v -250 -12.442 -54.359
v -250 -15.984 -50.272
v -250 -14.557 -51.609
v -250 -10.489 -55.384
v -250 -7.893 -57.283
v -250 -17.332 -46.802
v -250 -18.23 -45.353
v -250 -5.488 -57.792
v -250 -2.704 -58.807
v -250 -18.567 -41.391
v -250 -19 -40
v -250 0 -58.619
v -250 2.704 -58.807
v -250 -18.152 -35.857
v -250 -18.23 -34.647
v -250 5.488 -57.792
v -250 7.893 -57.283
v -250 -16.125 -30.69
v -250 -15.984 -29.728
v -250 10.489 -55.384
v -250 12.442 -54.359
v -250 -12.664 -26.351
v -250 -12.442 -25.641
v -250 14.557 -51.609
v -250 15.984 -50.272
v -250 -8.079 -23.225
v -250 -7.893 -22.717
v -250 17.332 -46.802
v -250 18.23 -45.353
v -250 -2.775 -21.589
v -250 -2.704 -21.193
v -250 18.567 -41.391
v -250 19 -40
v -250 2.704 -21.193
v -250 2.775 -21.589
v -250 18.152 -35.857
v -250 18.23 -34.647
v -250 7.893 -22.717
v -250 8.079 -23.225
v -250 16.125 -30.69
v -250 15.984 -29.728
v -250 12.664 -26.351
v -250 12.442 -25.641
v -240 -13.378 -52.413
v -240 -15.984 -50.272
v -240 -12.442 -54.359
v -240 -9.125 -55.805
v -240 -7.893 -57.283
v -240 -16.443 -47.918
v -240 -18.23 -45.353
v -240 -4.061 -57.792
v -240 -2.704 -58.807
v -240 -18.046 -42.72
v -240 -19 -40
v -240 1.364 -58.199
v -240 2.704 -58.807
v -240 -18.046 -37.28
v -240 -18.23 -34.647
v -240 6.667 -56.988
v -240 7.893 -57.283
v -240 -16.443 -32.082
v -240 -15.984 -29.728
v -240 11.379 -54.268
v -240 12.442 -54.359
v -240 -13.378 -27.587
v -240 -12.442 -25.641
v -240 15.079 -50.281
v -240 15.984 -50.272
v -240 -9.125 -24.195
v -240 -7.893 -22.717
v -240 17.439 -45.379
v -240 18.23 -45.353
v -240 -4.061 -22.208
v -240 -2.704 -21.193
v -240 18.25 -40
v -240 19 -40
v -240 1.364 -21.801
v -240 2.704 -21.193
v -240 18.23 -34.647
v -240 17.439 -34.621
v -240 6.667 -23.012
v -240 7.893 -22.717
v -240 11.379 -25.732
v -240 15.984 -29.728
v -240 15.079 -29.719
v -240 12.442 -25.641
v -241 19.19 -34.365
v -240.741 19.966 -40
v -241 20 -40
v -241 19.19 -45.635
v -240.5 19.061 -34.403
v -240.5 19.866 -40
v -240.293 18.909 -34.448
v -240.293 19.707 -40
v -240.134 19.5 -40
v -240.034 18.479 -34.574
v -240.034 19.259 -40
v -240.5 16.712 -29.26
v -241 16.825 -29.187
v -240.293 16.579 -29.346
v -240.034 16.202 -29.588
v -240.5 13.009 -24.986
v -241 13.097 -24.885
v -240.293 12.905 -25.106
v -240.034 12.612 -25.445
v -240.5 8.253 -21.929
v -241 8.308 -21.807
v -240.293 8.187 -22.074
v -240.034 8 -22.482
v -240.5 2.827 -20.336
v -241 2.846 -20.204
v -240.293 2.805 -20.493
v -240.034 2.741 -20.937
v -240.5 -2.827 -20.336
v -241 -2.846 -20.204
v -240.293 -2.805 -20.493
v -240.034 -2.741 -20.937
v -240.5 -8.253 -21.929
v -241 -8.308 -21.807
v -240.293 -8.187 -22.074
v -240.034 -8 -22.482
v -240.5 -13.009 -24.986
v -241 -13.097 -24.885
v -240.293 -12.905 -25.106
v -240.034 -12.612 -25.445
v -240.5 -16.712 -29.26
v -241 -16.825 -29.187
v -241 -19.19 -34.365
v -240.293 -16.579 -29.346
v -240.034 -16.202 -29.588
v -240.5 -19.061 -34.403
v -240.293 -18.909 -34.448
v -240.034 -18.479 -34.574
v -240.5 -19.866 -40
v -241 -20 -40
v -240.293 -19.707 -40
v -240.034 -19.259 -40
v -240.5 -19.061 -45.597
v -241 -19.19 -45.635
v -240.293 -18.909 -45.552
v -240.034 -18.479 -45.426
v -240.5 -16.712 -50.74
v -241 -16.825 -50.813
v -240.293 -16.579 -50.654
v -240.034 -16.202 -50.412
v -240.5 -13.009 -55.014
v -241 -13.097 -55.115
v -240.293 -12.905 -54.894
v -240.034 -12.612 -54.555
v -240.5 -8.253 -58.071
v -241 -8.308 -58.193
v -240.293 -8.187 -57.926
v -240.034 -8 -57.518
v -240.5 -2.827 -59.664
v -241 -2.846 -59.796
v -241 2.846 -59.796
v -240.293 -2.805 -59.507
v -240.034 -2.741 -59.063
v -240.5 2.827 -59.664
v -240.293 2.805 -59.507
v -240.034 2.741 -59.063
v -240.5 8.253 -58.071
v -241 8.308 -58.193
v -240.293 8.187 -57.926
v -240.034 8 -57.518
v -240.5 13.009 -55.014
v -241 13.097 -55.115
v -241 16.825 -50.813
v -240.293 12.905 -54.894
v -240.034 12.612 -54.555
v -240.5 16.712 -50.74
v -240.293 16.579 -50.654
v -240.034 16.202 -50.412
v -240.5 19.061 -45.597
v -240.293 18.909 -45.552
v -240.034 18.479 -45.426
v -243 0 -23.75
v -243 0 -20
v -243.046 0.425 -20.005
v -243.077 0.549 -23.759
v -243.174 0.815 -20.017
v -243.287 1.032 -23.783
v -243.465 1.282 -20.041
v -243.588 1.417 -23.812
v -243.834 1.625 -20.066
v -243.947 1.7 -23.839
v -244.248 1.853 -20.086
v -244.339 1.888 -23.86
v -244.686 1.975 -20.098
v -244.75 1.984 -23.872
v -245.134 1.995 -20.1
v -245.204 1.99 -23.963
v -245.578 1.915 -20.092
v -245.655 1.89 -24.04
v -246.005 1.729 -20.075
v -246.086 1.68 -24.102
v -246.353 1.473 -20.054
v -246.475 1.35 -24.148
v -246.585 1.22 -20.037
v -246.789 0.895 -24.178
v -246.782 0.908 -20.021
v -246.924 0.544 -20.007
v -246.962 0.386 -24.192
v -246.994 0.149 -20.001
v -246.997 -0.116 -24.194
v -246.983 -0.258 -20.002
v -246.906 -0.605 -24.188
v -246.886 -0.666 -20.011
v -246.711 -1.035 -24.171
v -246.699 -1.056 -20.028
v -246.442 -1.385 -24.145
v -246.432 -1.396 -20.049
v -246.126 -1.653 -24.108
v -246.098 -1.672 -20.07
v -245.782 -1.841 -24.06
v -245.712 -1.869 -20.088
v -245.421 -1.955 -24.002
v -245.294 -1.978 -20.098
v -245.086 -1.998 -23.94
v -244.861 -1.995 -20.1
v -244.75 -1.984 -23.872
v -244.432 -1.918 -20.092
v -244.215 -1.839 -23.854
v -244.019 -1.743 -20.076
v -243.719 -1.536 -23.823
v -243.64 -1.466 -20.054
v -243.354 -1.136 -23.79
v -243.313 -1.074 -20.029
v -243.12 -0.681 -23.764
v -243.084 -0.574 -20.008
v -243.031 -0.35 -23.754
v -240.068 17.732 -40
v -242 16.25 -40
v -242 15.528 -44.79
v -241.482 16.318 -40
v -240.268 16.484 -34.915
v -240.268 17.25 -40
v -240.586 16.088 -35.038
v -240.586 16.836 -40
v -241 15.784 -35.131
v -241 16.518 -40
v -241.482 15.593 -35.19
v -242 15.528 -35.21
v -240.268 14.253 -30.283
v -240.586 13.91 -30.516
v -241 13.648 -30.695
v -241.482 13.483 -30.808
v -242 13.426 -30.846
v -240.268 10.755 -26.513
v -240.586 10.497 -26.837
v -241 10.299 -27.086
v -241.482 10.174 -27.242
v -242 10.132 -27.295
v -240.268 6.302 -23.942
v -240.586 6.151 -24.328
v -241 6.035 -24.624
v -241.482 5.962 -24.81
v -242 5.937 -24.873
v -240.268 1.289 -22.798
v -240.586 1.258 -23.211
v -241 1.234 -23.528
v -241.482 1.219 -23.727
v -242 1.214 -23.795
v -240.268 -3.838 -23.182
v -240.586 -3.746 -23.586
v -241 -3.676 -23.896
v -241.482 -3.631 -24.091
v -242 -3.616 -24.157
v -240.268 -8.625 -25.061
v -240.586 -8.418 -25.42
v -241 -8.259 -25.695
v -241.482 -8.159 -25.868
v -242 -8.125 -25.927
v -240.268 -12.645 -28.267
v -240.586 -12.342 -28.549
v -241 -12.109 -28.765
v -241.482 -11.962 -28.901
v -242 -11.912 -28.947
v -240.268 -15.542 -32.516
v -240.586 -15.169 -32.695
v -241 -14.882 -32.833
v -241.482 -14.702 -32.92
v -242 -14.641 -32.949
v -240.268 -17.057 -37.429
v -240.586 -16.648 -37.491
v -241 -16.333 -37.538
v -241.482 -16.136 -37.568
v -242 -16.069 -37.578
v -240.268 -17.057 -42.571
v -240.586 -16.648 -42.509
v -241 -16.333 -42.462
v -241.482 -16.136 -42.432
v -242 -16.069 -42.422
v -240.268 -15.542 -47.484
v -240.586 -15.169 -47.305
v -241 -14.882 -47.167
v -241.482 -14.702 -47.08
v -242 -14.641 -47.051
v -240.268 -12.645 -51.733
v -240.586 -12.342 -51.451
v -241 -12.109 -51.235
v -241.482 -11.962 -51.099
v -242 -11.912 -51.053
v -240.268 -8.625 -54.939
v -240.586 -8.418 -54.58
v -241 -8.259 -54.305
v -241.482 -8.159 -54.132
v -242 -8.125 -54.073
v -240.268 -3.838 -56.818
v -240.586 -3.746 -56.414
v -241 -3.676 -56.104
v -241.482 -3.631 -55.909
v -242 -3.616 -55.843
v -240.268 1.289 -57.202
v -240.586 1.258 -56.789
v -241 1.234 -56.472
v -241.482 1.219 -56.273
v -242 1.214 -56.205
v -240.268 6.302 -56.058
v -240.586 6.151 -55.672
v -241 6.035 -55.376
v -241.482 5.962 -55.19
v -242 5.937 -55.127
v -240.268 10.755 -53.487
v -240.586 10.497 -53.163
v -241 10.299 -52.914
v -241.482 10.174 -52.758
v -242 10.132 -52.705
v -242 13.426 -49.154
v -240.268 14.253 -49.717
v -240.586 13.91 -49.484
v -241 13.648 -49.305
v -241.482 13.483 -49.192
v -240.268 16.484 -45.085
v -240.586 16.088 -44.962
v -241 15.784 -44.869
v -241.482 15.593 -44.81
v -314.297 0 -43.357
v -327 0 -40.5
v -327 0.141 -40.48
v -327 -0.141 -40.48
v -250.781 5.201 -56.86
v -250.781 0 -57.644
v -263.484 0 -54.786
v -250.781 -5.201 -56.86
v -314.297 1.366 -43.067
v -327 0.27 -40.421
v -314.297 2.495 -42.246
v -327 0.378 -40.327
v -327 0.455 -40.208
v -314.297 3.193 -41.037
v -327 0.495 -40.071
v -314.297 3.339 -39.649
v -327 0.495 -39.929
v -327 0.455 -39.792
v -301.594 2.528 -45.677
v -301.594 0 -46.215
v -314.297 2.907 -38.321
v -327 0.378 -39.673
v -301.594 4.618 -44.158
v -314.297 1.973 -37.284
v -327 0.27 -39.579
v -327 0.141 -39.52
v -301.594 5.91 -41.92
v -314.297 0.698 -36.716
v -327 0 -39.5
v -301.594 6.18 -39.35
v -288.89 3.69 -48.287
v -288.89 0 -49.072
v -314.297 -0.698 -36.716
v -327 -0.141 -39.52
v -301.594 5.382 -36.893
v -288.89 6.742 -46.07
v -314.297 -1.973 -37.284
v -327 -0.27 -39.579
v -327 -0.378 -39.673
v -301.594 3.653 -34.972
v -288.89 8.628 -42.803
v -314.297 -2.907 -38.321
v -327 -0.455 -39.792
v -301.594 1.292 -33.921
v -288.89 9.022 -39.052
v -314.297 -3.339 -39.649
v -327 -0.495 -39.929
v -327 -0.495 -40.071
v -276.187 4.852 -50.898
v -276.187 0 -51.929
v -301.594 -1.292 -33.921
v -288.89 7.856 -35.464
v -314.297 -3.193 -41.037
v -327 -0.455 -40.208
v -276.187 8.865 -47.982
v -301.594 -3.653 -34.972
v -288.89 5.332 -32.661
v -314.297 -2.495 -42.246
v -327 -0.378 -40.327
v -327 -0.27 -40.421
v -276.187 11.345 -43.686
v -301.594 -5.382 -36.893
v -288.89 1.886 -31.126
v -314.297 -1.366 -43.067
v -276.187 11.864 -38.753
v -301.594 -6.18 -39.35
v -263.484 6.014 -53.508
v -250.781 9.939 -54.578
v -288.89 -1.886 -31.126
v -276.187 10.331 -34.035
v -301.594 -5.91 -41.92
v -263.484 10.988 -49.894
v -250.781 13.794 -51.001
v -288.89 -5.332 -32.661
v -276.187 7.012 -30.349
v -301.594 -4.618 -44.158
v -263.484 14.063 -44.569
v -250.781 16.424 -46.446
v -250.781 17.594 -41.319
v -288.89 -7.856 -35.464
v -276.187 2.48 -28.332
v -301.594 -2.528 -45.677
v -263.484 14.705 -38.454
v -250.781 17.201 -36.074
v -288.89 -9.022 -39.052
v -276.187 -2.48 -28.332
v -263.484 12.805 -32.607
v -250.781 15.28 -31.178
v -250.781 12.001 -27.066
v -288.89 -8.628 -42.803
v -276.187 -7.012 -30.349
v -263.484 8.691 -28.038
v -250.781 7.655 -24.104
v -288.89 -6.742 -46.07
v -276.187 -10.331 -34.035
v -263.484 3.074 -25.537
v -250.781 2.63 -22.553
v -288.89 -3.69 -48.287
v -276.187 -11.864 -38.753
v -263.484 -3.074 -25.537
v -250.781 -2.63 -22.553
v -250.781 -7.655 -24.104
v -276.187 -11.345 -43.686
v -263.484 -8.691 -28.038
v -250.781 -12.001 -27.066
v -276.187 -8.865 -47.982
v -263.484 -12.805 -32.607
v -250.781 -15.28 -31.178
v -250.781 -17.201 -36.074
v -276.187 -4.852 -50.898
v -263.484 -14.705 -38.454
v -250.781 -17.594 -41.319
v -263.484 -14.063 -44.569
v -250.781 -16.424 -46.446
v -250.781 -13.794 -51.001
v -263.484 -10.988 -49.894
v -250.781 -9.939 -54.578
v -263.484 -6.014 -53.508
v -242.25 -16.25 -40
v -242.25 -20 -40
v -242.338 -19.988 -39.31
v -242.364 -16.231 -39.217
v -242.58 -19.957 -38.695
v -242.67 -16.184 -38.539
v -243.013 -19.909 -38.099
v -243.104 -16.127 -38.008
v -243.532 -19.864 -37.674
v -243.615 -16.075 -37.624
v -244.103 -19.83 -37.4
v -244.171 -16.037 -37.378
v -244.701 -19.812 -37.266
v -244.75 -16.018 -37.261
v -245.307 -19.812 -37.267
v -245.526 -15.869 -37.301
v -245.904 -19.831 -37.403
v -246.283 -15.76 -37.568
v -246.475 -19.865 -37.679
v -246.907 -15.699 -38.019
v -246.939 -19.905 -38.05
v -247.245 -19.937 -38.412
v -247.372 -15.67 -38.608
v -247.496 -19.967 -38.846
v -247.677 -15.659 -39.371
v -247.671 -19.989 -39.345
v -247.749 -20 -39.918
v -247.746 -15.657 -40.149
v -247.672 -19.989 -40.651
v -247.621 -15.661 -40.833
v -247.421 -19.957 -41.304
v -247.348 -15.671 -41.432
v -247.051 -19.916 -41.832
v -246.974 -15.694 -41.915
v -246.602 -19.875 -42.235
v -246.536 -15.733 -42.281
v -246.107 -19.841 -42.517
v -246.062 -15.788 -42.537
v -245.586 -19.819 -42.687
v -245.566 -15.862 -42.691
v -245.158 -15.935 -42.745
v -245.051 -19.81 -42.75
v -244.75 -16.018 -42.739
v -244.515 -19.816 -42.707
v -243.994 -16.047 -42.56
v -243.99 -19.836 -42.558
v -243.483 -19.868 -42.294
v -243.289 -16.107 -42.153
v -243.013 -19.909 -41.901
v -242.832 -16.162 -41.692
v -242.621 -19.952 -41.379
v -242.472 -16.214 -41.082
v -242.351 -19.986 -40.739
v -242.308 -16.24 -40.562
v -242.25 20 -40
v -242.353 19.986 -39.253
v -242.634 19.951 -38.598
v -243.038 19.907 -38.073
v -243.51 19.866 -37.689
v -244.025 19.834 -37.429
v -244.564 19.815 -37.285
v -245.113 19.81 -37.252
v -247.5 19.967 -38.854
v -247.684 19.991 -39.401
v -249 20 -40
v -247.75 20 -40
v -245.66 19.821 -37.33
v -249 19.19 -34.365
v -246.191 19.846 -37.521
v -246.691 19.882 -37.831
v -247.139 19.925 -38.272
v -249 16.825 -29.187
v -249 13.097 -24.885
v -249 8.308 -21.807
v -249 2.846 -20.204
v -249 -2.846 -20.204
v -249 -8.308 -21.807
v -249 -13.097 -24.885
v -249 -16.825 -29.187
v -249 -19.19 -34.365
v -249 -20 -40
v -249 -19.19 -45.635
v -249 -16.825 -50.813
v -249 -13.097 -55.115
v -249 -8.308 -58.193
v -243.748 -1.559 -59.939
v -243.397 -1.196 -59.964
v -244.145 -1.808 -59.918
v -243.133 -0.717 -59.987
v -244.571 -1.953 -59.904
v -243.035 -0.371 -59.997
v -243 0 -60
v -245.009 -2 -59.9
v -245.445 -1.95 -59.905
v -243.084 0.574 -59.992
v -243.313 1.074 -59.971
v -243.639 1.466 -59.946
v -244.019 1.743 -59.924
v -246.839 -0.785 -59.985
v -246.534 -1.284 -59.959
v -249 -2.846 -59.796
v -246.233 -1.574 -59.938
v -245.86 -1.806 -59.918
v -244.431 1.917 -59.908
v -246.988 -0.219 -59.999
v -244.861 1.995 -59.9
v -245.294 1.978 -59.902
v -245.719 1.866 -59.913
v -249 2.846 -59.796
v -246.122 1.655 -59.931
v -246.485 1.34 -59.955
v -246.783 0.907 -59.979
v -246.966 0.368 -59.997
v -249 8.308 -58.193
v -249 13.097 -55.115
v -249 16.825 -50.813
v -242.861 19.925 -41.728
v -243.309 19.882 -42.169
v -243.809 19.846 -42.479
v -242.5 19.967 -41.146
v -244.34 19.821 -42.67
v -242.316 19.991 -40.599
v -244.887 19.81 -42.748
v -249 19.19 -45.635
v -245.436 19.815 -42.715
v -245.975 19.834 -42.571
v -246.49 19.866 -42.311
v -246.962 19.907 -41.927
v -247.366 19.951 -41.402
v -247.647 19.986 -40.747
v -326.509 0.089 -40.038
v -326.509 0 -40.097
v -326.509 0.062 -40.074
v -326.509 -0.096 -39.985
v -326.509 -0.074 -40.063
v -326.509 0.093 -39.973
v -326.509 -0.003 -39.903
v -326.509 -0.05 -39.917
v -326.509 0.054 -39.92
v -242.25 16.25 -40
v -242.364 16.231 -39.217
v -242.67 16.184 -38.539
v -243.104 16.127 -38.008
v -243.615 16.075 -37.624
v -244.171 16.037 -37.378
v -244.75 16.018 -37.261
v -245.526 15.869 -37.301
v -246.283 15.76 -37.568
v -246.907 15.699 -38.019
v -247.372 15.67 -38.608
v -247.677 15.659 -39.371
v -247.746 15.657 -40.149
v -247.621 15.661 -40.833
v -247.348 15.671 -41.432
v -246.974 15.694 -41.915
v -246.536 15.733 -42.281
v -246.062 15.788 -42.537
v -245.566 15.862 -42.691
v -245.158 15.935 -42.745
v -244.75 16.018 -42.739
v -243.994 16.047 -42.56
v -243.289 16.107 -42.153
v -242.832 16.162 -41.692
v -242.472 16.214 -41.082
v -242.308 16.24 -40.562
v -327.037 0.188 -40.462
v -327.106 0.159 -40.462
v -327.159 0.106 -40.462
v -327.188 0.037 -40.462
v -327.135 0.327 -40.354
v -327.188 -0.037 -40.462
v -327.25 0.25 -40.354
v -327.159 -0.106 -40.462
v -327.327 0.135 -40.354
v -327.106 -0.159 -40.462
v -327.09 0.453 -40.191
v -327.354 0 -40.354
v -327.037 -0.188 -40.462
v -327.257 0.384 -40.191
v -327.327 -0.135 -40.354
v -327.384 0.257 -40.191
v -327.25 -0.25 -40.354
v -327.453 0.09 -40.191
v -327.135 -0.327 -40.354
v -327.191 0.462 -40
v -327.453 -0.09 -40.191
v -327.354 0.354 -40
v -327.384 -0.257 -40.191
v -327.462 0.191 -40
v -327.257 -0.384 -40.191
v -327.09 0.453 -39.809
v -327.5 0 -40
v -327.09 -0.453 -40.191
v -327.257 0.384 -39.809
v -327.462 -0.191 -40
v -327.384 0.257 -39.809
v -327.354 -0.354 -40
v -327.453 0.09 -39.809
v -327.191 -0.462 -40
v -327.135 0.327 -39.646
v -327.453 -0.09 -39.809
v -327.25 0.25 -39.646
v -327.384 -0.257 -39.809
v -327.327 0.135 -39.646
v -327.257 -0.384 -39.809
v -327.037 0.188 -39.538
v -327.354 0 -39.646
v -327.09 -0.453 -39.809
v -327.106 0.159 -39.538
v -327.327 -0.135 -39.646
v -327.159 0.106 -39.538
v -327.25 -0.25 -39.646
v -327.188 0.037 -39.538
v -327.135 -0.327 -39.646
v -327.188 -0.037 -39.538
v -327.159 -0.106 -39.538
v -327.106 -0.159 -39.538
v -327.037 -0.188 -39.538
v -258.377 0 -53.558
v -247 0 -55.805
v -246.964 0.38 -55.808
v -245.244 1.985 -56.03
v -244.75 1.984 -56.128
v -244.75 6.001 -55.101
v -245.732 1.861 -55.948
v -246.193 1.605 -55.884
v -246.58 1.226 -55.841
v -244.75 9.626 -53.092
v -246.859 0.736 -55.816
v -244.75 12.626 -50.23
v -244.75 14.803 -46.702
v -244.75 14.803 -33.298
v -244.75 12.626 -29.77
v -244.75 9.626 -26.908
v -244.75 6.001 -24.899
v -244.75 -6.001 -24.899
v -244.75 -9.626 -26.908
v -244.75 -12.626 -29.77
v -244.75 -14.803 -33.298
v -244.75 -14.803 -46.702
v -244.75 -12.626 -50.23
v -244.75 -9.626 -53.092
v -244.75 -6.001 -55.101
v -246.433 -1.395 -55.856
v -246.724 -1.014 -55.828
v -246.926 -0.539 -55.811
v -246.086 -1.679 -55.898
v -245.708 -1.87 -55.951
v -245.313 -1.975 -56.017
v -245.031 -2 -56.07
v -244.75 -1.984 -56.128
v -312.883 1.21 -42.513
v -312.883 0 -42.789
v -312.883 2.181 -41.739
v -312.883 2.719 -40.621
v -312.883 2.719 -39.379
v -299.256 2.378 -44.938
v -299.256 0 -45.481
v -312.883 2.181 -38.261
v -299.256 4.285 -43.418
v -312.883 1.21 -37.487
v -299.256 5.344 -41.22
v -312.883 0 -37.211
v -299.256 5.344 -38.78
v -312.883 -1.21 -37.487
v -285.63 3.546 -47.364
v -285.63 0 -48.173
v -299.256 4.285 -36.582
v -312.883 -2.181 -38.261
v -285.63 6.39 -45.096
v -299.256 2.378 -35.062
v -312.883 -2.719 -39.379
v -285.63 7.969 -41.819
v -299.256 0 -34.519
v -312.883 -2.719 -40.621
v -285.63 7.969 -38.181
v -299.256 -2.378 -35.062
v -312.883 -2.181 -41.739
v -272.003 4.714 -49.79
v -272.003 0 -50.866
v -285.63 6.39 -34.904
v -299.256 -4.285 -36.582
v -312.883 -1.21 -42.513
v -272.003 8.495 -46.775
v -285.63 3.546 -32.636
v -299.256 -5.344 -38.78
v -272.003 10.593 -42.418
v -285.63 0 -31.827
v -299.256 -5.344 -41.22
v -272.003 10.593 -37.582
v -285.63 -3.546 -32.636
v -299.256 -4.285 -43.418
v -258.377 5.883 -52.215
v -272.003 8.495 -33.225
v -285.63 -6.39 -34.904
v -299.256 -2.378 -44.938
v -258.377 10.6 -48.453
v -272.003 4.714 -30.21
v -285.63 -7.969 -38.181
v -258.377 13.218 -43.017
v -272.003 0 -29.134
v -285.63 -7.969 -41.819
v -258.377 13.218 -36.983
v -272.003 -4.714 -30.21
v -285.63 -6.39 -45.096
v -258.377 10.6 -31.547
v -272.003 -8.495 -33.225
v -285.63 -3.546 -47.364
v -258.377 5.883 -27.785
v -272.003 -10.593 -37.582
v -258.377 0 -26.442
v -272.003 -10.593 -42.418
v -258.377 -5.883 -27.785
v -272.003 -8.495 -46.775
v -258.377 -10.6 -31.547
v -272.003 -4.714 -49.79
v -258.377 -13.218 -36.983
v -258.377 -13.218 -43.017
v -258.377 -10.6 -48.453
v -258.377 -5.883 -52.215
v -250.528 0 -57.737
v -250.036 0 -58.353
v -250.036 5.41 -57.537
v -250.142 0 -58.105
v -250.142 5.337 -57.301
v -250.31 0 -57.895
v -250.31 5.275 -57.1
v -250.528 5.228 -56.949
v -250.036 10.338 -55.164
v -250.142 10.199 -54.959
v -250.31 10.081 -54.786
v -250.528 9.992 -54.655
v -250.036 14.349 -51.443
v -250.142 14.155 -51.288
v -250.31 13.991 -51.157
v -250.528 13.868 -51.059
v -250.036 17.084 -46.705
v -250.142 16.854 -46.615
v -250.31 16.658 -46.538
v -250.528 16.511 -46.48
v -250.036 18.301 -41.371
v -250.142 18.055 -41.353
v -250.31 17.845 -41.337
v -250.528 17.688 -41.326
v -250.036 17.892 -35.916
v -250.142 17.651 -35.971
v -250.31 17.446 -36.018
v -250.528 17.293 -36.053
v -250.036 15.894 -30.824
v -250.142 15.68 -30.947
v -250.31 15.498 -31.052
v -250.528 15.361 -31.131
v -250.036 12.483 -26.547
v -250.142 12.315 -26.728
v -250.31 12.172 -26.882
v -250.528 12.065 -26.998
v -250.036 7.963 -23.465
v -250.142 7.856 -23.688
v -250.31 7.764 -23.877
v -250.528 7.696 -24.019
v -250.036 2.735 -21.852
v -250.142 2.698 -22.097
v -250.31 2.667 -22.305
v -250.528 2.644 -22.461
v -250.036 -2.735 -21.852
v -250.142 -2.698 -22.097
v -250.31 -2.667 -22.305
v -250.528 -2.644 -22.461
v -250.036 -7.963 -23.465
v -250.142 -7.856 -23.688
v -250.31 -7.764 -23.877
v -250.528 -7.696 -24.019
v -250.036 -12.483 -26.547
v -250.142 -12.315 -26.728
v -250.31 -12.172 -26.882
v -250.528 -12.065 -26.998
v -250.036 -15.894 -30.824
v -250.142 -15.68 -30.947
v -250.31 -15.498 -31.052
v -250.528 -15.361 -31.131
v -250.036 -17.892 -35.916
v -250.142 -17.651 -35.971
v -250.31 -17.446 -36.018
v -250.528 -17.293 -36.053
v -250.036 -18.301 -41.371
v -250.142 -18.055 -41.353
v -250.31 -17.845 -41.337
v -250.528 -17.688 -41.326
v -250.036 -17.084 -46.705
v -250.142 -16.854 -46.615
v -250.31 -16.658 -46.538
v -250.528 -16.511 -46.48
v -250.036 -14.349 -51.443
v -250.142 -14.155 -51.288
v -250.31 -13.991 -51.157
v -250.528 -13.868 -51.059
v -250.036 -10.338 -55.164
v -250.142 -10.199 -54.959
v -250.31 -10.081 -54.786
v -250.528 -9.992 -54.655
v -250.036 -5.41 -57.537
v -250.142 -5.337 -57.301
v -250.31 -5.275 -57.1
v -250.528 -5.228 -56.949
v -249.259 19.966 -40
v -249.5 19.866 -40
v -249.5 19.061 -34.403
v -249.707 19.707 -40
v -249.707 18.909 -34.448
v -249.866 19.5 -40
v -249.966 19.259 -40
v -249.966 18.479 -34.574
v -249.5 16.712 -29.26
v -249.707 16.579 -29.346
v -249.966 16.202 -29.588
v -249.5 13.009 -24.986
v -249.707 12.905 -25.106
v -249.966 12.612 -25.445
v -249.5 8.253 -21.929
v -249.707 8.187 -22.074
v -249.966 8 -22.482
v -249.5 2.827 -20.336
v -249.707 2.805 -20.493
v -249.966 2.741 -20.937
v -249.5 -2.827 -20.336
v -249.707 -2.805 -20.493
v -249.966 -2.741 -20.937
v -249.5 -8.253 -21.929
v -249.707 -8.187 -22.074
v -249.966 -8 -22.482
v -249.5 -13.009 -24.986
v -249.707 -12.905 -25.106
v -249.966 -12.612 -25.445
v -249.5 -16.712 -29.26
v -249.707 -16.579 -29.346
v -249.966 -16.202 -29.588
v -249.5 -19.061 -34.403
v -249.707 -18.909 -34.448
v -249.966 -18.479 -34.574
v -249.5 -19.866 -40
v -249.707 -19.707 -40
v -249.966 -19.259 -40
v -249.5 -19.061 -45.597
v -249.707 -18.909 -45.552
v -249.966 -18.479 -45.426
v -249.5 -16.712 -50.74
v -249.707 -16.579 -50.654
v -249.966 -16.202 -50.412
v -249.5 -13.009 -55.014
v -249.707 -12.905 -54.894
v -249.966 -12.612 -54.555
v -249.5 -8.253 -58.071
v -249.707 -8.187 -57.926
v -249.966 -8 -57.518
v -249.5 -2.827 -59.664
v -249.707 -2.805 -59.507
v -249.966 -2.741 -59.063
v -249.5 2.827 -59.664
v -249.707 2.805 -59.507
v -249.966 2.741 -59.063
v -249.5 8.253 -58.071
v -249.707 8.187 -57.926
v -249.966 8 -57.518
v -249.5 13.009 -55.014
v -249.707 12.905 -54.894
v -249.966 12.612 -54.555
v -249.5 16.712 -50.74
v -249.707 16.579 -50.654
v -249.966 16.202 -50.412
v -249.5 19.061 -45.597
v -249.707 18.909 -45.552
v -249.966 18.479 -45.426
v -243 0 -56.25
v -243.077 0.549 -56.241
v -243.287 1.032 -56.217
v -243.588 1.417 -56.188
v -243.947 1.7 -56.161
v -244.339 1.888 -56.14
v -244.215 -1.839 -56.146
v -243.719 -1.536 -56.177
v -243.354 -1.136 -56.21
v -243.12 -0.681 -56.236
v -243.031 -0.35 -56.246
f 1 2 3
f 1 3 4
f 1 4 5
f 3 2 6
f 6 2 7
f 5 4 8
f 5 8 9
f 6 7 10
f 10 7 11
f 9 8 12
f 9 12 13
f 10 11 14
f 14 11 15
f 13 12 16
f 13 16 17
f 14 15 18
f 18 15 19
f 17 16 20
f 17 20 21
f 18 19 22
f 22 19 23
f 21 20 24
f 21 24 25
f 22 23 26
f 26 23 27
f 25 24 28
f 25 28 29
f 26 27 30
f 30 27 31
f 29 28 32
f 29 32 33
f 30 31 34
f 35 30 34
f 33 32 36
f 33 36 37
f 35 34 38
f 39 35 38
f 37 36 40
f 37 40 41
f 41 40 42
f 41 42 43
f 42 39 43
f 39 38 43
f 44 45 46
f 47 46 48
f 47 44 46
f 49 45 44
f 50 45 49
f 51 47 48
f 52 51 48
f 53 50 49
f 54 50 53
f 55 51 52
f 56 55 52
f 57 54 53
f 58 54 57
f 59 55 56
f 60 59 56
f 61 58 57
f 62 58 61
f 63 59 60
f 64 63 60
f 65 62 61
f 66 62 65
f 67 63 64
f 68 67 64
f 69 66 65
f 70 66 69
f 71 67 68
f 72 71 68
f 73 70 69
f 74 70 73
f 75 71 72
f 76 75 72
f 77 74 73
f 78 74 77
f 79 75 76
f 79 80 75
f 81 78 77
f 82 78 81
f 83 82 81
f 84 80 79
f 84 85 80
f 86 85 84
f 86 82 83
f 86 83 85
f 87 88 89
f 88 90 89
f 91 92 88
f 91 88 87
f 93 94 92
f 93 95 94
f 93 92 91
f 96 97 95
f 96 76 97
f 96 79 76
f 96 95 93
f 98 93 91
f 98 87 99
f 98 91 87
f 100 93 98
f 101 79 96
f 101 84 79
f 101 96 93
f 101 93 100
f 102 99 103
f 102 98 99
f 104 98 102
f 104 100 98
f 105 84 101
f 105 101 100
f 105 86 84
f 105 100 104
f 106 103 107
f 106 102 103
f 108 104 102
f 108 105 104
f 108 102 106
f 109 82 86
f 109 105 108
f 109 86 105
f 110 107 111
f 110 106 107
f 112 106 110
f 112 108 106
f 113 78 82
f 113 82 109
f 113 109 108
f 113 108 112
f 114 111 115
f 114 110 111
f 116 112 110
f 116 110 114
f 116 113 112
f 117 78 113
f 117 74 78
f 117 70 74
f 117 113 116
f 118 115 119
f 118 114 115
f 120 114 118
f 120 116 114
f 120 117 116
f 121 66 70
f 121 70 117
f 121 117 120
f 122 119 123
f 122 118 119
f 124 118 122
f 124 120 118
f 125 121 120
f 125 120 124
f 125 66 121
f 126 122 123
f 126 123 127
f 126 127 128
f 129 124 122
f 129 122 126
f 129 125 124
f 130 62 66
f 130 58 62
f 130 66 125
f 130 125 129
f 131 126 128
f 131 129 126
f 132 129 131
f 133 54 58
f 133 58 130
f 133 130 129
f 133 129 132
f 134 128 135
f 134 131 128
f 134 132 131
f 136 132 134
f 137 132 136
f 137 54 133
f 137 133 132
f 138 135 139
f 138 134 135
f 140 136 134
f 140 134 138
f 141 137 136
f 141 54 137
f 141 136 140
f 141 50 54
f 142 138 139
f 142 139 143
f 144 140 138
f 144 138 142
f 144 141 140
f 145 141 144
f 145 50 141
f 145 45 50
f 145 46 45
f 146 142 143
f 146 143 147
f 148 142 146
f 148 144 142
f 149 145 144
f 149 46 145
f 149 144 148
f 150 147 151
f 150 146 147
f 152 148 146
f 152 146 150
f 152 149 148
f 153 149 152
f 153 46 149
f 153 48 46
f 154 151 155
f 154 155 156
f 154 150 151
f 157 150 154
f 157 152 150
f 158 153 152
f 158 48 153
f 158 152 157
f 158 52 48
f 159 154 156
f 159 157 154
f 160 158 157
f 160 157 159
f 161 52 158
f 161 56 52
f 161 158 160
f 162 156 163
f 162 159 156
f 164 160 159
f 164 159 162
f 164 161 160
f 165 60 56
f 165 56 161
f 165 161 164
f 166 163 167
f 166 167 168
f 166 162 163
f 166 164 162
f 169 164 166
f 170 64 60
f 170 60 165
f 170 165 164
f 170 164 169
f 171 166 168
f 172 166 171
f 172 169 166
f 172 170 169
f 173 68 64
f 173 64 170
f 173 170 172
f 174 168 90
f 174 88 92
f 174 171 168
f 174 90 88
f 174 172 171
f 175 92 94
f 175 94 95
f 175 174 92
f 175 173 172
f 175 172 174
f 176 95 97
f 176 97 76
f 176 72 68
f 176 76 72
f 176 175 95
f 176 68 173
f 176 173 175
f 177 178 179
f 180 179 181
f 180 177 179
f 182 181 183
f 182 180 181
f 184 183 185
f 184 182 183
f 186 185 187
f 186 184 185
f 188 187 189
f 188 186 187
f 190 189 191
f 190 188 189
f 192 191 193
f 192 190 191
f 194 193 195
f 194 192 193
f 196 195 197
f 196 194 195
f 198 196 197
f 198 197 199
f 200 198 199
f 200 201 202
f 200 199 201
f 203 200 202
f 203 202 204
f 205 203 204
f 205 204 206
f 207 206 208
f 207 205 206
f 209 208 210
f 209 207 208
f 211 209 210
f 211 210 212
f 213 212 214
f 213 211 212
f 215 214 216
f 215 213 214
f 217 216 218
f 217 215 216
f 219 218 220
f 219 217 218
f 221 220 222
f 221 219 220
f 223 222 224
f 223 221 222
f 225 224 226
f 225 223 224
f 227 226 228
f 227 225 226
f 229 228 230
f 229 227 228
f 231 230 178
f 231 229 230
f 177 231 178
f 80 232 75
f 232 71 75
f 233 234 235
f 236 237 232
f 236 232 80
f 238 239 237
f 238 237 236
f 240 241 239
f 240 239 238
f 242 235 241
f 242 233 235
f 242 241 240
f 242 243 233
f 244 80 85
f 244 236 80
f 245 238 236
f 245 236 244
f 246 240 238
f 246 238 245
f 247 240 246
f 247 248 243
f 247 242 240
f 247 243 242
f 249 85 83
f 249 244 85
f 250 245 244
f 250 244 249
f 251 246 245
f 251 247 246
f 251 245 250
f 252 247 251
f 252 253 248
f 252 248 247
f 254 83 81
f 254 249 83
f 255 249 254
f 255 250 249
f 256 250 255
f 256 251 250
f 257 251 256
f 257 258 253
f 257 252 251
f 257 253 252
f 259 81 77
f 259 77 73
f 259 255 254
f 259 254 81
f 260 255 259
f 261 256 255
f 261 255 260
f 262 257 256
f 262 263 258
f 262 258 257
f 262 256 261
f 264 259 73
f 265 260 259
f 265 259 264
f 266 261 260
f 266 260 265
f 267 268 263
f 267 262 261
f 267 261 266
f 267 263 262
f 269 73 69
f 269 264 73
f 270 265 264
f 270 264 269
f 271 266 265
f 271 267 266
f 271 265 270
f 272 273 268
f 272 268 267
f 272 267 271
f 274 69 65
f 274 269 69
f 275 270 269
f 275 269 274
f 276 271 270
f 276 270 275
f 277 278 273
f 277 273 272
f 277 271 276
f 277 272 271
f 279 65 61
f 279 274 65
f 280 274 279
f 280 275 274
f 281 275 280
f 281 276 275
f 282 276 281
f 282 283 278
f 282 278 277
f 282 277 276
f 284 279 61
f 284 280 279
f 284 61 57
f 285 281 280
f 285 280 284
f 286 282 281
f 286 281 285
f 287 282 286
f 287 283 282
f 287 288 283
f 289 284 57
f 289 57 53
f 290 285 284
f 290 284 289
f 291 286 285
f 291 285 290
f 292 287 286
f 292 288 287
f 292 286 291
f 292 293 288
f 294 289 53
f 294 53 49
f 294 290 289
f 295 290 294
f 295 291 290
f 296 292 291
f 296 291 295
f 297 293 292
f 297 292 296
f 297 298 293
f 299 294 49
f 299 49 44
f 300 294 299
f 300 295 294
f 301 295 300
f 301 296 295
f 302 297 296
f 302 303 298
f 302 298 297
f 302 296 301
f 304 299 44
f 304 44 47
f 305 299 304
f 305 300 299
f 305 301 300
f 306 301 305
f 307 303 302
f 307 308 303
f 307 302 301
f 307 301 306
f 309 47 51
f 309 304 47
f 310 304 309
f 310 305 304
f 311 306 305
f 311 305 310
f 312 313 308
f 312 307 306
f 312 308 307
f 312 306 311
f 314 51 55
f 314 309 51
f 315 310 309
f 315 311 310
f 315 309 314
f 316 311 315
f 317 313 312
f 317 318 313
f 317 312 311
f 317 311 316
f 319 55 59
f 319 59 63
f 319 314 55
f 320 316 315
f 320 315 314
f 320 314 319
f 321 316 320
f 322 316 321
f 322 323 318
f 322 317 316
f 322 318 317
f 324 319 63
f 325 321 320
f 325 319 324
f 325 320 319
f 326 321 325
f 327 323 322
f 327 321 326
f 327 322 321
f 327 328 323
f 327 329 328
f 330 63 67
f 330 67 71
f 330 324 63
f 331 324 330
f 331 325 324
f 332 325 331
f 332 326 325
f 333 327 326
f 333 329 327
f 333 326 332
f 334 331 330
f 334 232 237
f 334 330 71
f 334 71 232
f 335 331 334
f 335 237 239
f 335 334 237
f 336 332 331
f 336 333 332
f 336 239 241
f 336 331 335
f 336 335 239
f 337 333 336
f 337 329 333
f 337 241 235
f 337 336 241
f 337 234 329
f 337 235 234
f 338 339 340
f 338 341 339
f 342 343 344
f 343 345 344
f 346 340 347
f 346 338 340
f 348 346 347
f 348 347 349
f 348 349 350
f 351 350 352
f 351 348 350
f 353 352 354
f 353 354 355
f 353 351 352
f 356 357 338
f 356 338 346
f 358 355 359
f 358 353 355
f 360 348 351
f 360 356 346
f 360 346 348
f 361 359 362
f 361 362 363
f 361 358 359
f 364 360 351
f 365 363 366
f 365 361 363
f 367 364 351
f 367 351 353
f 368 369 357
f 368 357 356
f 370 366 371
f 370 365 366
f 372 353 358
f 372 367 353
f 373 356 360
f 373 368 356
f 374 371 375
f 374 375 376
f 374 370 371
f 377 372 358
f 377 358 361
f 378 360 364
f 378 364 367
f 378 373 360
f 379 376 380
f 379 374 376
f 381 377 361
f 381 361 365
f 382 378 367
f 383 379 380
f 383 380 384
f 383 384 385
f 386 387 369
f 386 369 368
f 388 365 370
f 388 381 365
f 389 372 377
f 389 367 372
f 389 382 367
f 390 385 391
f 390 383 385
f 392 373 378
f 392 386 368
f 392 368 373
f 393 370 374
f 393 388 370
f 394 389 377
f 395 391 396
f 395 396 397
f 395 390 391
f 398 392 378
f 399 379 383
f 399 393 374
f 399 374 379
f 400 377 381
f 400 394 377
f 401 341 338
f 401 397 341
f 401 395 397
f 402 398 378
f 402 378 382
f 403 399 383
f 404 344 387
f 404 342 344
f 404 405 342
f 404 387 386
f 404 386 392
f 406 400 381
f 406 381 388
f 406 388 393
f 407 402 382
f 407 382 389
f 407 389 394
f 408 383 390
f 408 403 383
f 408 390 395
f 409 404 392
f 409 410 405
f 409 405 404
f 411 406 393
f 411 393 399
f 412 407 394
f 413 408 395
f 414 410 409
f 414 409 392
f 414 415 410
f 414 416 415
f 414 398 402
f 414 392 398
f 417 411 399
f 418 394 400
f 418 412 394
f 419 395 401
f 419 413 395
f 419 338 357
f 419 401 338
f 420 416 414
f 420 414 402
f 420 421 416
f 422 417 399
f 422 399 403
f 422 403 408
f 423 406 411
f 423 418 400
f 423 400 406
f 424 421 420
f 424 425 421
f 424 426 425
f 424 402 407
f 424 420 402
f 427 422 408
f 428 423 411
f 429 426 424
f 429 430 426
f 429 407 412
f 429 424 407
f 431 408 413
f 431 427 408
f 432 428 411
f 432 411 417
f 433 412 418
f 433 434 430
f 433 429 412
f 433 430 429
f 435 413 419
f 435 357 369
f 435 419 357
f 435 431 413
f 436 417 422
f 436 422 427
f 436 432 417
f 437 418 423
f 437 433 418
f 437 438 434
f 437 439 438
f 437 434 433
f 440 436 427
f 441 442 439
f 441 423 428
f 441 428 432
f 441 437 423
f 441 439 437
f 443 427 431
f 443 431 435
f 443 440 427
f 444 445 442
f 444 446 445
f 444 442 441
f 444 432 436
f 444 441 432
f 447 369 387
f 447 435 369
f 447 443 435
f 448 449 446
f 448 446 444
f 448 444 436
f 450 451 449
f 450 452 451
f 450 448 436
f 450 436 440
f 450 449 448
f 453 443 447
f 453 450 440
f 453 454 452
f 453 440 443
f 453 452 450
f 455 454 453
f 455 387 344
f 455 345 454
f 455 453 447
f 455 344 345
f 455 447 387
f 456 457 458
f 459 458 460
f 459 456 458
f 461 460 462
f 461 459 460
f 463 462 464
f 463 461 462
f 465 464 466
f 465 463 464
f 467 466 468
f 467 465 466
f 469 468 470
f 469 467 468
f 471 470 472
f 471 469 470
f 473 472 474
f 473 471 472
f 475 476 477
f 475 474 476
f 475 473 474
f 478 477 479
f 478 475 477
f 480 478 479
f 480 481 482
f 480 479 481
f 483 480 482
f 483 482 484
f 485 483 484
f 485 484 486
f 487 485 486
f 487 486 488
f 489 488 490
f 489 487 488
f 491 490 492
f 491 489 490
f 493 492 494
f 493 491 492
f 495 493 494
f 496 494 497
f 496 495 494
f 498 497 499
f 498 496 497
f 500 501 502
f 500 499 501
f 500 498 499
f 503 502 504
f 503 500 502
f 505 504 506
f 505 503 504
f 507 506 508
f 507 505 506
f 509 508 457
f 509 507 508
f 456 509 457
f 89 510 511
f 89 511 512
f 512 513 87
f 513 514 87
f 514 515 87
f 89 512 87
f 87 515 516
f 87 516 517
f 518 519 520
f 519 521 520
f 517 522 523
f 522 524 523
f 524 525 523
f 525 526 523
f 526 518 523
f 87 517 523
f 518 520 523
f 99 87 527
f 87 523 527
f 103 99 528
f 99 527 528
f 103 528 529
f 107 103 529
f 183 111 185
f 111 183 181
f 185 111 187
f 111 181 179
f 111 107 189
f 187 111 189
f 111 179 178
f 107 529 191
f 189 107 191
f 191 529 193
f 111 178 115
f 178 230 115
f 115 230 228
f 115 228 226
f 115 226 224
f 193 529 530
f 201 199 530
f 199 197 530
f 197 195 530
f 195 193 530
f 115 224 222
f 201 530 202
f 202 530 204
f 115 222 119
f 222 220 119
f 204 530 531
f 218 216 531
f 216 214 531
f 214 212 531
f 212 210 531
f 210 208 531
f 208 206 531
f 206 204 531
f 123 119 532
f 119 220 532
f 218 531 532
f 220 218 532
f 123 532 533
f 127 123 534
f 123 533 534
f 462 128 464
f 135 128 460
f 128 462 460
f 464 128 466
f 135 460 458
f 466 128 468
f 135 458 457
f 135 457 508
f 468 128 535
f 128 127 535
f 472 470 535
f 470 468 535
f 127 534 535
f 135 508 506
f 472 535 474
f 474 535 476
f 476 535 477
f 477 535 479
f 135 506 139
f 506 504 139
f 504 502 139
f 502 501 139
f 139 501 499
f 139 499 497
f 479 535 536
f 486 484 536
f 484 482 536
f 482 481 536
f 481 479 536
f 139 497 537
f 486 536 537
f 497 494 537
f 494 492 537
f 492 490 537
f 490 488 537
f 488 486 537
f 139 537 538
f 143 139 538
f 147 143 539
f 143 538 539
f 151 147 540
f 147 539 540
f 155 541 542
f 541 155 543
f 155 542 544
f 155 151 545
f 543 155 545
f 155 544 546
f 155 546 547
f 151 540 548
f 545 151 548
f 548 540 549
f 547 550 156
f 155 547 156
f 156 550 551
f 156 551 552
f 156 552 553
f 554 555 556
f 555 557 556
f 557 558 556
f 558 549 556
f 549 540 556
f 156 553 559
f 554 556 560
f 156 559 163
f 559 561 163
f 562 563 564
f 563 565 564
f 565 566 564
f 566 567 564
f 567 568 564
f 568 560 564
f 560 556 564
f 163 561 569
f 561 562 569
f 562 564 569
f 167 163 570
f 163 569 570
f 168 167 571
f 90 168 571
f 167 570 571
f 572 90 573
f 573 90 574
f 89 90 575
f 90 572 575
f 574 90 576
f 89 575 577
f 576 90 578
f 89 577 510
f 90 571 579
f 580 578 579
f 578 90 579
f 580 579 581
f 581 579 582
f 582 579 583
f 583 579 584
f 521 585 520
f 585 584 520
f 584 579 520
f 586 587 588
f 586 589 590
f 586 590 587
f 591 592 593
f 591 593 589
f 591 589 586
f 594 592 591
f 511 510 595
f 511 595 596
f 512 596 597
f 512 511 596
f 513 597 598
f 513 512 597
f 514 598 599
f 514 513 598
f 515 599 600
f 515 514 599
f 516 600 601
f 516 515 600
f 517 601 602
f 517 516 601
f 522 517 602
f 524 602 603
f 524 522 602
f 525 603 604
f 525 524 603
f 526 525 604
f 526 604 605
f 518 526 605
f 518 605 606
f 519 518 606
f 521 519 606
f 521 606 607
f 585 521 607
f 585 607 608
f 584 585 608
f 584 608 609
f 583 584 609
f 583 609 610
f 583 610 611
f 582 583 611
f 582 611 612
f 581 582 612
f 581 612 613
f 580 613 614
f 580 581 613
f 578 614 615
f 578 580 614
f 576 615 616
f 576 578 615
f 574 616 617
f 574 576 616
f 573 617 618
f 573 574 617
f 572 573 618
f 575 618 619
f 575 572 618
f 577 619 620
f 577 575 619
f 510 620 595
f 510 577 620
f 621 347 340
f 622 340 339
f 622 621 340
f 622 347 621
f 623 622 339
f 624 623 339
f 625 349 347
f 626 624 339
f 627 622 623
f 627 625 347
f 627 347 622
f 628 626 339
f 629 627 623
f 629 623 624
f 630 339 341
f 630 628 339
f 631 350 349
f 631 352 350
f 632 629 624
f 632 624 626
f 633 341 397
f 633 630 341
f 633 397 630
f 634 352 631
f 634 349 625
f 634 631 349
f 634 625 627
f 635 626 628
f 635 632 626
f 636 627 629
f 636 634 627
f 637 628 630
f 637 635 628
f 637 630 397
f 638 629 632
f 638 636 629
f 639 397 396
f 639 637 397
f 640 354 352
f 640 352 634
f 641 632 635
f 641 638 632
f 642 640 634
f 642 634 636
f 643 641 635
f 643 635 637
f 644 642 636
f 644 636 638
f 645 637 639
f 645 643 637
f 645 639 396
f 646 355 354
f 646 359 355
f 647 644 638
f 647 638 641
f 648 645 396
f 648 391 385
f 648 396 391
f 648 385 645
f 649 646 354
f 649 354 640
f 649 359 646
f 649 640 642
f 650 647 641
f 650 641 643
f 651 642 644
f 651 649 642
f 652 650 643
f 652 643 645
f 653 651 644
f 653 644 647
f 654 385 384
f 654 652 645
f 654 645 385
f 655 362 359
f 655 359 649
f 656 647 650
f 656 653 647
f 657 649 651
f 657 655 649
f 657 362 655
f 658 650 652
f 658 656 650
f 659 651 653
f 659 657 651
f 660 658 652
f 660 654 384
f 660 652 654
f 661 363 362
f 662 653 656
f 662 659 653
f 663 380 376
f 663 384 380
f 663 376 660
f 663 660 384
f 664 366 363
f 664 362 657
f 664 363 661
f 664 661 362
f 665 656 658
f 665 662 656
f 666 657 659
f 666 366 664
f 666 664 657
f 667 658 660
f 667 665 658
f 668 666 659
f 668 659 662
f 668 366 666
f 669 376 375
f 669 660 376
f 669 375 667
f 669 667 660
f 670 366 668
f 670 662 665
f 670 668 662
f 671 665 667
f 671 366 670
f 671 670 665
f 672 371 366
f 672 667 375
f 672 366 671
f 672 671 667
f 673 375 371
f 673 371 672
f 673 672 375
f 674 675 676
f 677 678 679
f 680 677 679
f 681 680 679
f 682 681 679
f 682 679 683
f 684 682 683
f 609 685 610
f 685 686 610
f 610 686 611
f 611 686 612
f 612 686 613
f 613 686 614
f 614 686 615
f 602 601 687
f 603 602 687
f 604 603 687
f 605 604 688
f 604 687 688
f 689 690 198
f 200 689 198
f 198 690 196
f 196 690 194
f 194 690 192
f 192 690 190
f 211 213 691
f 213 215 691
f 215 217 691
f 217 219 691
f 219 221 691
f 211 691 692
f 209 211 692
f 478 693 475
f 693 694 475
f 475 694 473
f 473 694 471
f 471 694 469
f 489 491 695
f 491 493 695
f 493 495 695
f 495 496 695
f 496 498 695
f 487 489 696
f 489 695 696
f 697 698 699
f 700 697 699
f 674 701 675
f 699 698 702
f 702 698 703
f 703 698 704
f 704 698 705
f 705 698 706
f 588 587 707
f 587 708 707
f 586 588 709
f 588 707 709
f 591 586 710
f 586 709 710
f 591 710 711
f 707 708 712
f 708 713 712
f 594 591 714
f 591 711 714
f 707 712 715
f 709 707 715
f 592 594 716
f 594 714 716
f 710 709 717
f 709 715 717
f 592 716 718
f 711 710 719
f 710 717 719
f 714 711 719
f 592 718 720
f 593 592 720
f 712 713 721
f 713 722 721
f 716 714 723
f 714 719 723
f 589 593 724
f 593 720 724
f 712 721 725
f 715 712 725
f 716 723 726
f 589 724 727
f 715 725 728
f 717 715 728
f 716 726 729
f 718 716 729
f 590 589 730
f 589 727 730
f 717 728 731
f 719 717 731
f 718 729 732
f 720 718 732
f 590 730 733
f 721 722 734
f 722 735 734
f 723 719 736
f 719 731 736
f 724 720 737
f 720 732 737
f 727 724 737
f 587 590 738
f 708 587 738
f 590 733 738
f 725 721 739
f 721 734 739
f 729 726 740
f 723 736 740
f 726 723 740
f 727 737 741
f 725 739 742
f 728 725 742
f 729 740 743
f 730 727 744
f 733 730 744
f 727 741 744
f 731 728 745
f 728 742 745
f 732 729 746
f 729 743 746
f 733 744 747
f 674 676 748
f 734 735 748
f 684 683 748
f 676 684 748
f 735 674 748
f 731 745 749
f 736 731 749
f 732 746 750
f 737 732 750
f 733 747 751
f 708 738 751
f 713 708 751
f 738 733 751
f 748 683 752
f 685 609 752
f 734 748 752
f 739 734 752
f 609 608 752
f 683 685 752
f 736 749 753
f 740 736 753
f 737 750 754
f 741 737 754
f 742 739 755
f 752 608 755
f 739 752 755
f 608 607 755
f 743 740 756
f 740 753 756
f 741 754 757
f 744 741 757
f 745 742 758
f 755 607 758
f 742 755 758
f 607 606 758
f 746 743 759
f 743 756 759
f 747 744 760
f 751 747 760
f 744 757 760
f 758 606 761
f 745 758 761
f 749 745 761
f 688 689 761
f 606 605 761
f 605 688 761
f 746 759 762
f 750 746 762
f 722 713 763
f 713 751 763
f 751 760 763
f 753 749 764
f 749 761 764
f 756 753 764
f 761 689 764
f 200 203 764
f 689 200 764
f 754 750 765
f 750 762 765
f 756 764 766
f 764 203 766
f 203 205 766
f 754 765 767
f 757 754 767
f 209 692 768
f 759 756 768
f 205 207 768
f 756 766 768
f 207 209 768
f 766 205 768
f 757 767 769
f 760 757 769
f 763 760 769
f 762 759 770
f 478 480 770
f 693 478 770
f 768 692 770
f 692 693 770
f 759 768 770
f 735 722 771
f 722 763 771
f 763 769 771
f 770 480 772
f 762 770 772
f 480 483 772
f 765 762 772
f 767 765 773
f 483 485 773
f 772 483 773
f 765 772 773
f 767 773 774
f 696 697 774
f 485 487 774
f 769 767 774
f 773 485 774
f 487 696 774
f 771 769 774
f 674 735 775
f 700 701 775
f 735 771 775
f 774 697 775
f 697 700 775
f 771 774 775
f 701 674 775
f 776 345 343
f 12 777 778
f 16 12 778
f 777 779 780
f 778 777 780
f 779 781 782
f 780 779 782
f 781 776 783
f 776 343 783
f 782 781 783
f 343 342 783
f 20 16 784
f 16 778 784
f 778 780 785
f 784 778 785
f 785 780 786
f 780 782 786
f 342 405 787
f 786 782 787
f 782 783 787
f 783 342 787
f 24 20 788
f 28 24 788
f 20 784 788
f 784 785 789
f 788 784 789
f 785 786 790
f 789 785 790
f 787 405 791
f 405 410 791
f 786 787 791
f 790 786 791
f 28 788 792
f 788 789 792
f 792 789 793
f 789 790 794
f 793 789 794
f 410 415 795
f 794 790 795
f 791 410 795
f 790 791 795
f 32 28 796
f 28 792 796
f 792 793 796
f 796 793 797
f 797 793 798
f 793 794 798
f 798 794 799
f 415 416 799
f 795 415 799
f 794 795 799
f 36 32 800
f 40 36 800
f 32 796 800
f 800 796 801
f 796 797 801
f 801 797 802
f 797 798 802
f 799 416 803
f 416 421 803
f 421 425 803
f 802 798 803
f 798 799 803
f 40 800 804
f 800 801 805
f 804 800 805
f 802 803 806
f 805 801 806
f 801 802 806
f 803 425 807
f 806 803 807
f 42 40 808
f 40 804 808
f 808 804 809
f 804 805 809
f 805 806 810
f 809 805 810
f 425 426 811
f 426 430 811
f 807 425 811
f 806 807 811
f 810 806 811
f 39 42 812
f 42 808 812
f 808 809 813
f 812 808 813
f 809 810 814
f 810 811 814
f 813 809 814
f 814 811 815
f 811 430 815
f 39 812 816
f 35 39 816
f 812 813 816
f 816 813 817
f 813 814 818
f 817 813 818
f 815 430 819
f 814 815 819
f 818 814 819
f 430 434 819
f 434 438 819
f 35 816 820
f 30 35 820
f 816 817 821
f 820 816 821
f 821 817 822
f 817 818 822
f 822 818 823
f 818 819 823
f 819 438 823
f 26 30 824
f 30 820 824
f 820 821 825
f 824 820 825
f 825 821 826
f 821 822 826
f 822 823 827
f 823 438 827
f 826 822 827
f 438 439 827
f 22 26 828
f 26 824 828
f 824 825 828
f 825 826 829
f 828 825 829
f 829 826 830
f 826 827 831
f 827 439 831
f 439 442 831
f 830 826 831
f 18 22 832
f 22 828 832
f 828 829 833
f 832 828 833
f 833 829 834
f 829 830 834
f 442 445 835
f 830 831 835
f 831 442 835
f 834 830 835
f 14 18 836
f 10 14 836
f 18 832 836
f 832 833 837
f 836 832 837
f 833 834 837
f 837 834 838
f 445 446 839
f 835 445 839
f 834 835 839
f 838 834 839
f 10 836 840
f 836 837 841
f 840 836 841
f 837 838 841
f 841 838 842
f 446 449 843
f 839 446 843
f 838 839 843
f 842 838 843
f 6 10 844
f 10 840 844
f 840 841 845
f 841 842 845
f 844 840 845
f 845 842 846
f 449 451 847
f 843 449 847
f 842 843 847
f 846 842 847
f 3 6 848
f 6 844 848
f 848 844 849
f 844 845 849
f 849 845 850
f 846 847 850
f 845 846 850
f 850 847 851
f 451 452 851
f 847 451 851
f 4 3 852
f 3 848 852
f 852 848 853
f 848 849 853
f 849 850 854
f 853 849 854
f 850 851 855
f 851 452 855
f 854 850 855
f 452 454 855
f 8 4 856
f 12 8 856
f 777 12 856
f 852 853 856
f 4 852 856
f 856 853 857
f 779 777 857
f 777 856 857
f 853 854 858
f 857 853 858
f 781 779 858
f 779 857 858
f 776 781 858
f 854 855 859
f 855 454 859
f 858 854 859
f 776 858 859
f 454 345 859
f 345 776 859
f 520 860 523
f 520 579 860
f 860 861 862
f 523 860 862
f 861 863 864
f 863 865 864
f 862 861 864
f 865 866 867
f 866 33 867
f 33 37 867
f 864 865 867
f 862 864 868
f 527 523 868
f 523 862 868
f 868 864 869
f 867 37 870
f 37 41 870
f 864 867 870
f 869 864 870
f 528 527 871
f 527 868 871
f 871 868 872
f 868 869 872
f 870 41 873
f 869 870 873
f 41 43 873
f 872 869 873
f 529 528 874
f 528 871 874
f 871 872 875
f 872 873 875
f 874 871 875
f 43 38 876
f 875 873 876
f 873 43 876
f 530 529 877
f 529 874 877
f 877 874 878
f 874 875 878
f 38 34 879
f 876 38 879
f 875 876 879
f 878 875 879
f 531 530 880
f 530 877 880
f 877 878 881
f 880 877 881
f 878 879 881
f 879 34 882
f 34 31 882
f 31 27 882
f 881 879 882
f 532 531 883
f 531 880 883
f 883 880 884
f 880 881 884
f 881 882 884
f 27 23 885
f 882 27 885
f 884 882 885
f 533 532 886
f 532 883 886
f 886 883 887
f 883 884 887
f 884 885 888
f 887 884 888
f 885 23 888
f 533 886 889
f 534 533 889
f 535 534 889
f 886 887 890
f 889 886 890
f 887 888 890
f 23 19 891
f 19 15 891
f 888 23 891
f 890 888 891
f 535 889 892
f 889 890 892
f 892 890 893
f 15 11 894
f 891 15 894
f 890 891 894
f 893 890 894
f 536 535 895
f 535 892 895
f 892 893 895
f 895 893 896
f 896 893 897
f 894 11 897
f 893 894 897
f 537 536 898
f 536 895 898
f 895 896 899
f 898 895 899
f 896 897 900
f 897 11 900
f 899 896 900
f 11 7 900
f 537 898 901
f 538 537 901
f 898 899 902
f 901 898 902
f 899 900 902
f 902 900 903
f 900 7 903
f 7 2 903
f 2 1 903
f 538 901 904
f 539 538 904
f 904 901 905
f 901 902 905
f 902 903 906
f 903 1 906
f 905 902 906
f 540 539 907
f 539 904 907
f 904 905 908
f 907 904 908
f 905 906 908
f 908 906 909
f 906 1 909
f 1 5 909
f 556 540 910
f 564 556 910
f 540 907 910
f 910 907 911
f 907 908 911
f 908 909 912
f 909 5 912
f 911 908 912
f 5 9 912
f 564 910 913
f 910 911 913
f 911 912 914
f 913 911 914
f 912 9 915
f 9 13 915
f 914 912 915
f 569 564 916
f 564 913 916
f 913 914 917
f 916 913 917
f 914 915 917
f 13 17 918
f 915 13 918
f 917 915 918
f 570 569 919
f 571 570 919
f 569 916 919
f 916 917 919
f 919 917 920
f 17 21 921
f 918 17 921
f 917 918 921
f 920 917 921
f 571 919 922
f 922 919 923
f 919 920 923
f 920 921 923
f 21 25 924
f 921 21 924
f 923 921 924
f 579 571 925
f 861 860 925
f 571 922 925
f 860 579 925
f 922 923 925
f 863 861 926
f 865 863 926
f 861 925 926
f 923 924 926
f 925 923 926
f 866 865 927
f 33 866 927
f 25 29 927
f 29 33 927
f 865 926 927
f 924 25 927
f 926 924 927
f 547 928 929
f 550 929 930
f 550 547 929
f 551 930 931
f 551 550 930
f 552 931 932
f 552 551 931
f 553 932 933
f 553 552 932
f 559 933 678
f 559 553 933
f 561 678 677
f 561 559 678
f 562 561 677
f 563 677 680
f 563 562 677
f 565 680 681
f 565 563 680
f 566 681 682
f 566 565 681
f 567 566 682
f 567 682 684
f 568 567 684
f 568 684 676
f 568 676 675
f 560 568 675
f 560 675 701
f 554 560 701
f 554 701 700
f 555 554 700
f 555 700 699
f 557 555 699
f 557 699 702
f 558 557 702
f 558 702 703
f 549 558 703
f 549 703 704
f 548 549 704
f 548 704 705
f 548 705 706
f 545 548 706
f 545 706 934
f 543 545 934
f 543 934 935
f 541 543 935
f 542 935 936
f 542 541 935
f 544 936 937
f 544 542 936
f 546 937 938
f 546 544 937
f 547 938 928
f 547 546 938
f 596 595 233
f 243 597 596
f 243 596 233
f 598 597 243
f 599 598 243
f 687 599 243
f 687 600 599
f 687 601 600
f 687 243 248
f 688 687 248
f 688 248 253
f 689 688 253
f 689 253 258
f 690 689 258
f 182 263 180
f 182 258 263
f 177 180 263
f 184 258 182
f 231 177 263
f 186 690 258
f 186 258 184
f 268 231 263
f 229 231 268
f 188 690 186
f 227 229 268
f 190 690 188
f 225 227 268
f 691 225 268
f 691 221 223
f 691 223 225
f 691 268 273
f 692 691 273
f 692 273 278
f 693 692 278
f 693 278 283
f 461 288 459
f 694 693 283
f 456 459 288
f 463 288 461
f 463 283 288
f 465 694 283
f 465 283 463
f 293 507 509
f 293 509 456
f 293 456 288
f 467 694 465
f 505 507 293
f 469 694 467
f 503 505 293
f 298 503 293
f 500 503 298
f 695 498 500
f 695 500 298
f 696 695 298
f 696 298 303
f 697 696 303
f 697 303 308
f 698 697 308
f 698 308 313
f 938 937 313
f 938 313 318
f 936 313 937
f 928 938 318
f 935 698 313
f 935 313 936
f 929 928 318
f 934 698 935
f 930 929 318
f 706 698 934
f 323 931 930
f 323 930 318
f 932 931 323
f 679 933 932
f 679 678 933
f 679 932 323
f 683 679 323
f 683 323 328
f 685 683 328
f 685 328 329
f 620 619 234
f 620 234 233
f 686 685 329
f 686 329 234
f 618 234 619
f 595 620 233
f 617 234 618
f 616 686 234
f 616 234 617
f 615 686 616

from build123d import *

# Parameters (mm, degrees)
SKETCH017_R      = 2
EXTRUDE017_DEPTH = 40
SKETCH016_R      = 2.75
EXTRUDE016_DEPTH = 40
SKETCH015_R      = 20
SKETCH015_R_2    = 16.25
EXTRUDE015_DEPTH = 10
FILLET013_R      = 1
FILLET014_R      = 2


with BuildPart() as extrude017:
    # Sketch017 → Extrude017 (new body)
    with BuildSketch(Plane.XY.offset(-60)):
        with Locations((-245, 0)):
            Circle(SKETCH017_R)
    extrude(amount=EXTRUDE017_DEPTH)


with BuildPart() as fusion134:
    # Sketch016 → Extrude016 (new body)
    with BuildSketch(Plane.XZ.offset(-20)):
        with Locations((-245, -40)):
            Circle(SKETCH016_R)
    extrude(amount=EXTRUDE016_DEPTH)

    # Fusion134: union Extrude017
    add(extrude017.part)


with BuildPart() as extrude015:
    # Sketch015 → Extrude015 (new body)
    with BuildSketch(Plane.YZ.offset(-250)):
        with Locations((0, -40)):
            Circle(SKETCH015_R)
        with Locations((0, -40)):
            Circle(SKETCH015_R_2, mode=Mode.SUBTRACT)
    extrude(amount=EXTRUDE015_DEPTH)


with BuildPart() as sphere:
    # Sphere → Sphere (revolve)
    with BuildSketch(Plane(origin=(-318, 0, 0), x_dir=(1, 0, 0), z_dir=(0, -1, 0))):
        with BuildLine():
            ThreePointArc((0, -0.5), (0.5, 0), (0, 0.5))
            Line((0, 0.5), (0, -0.5))
        make_face()
    revolve(axis=Axis((-318, 0, 0), (0, 0, 1)))


with BuildPart() as cone006:
    # Cone006 → Cone006 (revolve)
    with BuildSketch(Plane(origin=(-308, 0, 0), x_dir=(0, 0, -1), z_dir=(0, -1, 0))):
        Polygon((0, 0), (16.25, 82.25), (0, 82.25), align=None)
    revolve(axis=Axis((-308, 0, 0), (1, 0, 0)))


with BuildPart() as inletcover:
    # Cone005 → Cone005 (revolve)
    with BuildSketch(Plane(origin=(-308, 0, 0), x_dir=(0, 0, -1), z_dir=(0, -1, 0))):
        Polygon((0, 0), (0.5, 0), (19, 82.25), (0, 82.25), align=None)
    revolve(axis=Axis((-308, 0, 0), (1, 0, 0)))

    # Cut015: cut Cone006
    add(cone006.part, mode=Mode.SUBTRACT)


with BuildPart() as inletcover_1:
    # Cut015 placement: moved
    add(inletcover.part.moved(Location((-10, 0, 0))))

    # Fusion127: union Sphere
    add(sphere.part)


with BuildPart() as inletcover_2:
    # Fusion127 placement: moved
    add(inletcover_1.part.moved(Location((-9, 0, -40))))

    # Fusion135: union Extrude015
    add(extrude015.part)

    # Cut019: cut Fusion134
    add(fusion134.part, mode=Mode.SUBTRACT)

    # Fillet013
    fillet013_edges = [inletcover_2.edges().sort_by_distance(p)[0] for p in [
        (-250, -20, -40),
        (-240, -20, -40),
        (-250, 0, -22.180851),
    ]]
    fillet(fillet013_edges, radius=FILLET013_R)

    # Fillet014
    fillet014_edges = [inletcover_2.edges().sort_by_distance(p)[0] for p in [
        (-240, -16.25, -40),
    ]]
    fillet(fillet014_edges, radius=FILLET014_R)


solid = inletcover_2.part
